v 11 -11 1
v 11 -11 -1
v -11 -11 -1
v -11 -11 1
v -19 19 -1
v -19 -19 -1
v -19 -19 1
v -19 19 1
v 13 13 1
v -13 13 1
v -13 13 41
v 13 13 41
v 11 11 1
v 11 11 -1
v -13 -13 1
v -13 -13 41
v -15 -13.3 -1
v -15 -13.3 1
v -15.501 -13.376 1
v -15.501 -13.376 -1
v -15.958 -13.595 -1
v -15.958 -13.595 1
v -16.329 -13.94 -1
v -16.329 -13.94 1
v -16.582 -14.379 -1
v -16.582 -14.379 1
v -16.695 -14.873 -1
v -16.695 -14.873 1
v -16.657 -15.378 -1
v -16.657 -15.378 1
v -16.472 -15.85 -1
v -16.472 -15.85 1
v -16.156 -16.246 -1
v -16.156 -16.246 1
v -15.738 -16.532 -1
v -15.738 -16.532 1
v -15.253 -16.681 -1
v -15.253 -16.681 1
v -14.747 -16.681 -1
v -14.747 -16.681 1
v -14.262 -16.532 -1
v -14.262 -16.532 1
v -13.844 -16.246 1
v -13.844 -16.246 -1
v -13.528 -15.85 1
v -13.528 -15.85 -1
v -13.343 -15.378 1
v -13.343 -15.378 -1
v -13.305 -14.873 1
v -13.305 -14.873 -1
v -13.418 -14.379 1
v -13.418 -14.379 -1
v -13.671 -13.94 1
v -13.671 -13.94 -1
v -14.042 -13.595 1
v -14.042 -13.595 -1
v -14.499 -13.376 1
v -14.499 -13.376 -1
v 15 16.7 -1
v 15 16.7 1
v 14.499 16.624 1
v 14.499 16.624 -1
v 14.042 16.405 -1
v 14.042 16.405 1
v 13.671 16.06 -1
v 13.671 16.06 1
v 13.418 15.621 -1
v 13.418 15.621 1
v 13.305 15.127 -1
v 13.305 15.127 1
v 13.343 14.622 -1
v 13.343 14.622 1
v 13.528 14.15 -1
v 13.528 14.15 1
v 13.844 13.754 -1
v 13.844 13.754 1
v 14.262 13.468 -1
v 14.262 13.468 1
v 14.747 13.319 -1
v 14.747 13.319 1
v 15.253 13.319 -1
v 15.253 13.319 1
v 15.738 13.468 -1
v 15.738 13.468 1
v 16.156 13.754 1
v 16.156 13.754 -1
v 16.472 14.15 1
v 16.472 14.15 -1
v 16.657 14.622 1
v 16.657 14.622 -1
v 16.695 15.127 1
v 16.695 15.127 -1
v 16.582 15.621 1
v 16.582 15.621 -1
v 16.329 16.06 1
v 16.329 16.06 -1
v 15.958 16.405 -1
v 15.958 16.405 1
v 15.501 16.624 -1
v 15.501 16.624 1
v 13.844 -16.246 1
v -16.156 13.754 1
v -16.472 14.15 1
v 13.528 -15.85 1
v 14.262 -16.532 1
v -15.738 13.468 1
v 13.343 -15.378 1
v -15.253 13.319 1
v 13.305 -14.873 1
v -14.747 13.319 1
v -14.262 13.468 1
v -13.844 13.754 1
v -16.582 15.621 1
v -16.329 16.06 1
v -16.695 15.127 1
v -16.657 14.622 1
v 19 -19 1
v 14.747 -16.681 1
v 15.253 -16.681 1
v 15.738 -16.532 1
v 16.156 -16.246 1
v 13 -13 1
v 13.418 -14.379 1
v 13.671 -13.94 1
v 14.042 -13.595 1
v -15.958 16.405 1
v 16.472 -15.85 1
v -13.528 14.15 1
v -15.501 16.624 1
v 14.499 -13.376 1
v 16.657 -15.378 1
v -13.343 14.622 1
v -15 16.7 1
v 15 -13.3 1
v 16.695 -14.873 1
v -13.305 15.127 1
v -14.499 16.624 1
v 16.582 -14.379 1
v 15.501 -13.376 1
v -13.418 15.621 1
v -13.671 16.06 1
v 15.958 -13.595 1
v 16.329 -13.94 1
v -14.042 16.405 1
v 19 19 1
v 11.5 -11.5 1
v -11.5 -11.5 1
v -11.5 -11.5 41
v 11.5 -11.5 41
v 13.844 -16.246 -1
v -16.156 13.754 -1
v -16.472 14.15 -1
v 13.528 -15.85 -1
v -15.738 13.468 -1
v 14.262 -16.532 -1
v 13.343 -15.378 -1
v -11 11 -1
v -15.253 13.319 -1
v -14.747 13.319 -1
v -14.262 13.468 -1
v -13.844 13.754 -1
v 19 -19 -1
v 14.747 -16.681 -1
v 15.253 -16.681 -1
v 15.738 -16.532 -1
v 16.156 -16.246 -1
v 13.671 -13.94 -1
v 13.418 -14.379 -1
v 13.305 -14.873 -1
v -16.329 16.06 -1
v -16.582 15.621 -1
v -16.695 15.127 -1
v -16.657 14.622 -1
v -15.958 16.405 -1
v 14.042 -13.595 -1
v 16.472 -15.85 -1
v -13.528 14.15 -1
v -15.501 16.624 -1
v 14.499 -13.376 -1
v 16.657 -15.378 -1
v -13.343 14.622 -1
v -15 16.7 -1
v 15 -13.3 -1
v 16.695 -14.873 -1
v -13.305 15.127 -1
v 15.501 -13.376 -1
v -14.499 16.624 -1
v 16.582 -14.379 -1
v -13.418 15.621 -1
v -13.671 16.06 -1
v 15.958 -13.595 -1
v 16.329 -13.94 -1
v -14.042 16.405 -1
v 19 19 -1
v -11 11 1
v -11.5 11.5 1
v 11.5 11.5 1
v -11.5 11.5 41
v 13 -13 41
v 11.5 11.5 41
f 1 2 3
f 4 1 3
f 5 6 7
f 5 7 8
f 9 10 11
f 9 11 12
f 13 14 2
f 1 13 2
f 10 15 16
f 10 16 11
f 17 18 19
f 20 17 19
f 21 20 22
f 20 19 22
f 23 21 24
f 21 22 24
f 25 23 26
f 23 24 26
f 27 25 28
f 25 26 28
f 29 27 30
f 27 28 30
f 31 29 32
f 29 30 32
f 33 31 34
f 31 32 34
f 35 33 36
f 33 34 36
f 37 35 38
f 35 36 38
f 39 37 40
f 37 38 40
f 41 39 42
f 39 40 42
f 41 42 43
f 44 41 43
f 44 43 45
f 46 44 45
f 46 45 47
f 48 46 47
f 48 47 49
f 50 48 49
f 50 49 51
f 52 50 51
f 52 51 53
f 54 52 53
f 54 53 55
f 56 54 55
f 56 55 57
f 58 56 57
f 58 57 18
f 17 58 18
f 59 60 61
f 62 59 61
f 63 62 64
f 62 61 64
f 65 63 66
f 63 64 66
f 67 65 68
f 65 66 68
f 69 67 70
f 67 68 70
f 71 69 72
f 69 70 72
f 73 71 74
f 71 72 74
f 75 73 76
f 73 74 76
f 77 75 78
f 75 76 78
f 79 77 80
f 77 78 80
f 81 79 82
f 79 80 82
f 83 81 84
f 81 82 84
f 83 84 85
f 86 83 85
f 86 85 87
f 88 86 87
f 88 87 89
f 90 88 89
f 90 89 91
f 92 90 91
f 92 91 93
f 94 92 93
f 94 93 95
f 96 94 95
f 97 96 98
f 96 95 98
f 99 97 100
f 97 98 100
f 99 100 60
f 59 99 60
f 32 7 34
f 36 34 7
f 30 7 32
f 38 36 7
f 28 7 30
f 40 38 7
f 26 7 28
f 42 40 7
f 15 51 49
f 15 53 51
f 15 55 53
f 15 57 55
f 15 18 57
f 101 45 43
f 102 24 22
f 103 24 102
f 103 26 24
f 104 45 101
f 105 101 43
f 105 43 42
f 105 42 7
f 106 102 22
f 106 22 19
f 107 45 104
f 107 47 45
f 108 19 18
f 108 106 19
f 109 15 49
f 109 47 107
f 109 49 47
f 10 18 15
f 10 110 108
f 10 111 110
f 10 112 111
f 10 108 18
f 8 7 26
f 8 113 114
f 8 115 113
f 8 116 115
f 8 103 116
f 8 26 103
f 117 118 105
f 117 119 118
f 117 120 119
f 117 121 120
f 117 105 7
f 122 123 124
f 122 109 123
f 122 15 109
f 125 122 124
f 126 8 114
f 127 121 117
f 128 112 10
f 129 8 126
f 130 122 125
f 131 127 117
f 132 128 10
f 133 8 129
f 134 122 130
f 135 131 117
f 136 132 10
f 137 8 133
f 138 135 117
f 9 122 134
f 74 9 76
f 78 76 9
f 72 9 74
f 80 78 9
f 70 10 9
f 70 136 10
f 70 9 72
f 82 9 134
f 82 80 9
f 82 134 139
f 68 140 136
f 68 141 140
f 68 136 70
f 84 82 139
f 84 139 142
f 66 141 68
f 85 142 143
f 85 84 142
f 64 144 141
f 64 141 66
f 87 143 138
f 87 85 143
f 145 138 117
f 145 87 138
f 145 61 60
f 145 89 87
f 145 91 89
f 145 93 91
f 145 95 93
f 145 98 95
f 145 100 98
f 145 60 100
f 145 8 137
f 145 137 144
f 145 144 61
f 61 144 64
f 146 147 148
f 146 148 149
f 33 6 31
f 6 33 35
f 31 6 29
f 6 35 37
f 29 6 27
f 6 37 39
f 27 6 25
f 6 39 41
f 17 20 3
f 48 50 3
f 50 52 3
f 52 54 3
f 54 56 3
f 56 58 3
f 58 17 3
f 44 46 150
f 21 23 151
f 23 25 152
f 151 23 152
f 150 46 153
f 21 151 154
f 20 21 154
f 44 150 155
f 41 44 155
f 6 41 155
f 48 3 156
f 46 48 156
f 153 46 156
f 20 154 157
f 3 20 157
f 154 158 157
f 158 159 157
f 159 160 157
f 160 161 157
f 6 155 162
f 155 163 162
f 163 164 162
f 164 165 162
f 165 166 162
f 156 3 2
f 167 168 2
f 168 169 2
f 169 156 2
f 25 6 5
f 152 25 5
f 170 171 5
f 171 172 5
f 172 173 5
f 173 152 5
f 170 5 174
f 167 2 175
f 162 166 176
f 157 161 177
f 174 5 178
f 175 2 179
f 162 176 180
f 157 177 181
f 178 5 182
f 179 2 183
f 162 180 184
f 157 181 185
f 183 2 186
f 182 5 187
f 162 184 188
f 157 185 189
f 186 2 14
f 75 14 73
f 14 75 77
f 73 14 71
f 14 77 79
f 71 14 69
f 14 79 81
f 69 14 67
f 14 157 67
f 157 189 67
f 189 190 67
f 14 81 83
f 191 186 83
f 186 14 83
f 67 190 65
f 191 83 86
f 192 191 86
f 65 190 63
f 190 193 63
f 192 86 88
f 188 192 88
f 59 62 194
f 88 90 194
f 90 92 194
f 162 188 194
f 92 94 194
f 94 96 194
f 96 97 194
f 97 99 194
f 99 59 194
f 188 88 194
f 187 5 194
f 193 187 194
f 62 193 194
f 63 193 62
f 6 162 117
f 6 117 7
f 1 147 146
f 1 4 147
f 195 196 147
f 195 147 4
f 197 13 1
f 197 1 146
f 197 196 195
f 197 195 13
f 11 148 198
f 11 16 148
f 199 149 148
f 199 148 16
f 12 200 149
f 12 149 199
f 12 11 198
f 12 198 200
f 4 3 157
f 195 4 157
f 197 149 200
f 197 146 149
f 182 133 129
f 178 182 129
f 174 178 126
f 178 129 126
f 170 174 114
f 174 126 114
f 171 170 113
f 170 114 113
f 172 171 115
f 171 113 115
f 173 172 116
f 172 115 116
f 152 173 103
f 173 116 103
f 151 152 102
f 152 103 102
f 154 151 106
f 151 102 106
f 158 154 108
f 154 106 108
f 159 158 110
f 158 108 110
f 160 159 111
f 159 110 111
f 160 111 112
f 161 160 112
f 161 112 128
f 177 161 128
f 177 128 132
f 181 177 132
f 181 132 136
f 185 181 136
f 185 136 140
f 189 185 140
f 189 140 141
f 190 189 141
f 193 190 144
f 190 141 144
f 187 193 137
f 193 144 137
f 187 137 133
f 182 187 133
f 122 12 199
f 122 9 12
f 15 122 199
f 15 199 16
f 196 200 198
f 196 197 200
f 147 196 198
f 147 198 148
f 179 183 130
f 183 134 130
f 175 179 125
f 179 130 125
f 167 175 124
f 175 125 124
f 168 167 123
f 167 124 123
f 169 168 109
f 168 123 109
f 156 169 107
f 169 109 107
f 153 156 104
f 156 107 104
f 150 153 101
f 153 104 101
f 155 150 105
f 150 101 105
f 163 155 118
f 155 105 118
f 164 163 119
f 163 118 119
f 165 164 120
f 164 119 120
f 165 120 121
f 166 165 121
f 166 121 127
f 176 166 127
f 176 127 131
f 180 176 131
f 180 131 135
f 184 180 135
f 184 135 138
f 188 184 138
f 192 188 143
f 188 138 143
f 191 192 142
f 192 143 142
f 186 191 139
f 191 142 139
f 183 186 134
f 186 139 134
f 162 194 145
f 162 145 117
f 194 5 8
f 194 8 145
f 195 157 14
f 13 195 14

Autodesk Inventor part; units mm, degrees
ref_plane "YZ Plane" through (0, 0, 0) normal (1, 0, 0) x (0, 1, 0)
ref_plane "XZ Plane" through (0, 0, 0) normal (0, 1, 0) x (-1, 0, 0)
ref_plane "XY Plane" through (0, 0, 0) normal (0, 0, 1) x (1, 0, 0)
sketch "Sketch1" plane through (0, 0, 0) normal (0, 0, 1) x (1, 0, 0)
  line L0 (-19, 19) -> (19, 19)
  line L1 (19, 19) -> (19, -19)
  line L2 (19, -19) -> (-19, -19)
  line L3 (-19, -19) -> (-19, 19)
  line L4 (-19, 19) -> (19, -19) construction
  line L5 (19, 19) -> (-19, -19) construction
  line L6 (-11, 11) -> (11, 11)
  line L7 (11, 11) -> (11, -11)
  line L8 (11, -11) -> (-11, -11)
  line L9 (-11, -11) -> (-11, 11)
  line L10 (-11, 11) -> (11, -11) construction
  line L11 (11, 11) -> (-11, -11) construction
  point P0 (0, 0)
  dimension "d0" = 38
  dimension "d1" = 38
  dimension "d2" = 22
  dimension "d3" = 22
extrude "Extrusion1" add sketch "Sketch1" along normal mid plane 2
sketch "Sketch2" plane through (0, 0, 1) normal (0, 0, 1) x (1, 0, 0)
  line L0 (-13, 13) -> (13, 13)
  line L1 (13, 13) -> (13, -13)
  line L2 (13, -13) -> (-13, -13)
  line L3 (-13, -13) -> (-13, 13)
  line L4 (-13, 13) -> (13, -13) construction
  line L5 (13, 13) -> (-13, -13) construction
  line L6 (-11.5, -11.5) -> (11.5, -11.5)
  line L7 (11.5, -11.5) -> (11.5, 11.5)
  line L8 (11.5, 11.5) -> (-11.5, 11.5)
  line L9 (-11.5, 11.5) -> (-11.5, -11.5)
  line L10 (-11.5, -11.5) -> (11.5, 11.5) construction
  line L11 (11.5, -11.5) -> (-11.5, 11.5) construction
  point P0 (0, 0)
  dimension "d6" = 26
  dimension "d7" = 26
  dimension "d8" = 23
extrude "Extrusion2" add sketch "Sketch2" along normal blind 40
sketch "Sketch3" plane through (0, 0, -1) normal (0, 0, -1) x (-1, 0, 0)
  line L0 (11, -11) -> (11, 11) projected
  line L1 (11, 11) -> (-11, 11) projected
  line L2 (-11, 11) -> (-11, -11) projected
  line L3 (-11, -11) -> (11, -11) projected
  line L4 (19, 19) -> (19, -19) projected
  line L5 (19, -19) -> (-19, -19) projected
  line L6 (-19, -19) -> (-19, 19) projected
  line L7 (-19, 19) -> (19, 19) projected
  point P0 (0, 0)
  point P1 (15, -15)
  point P2 (-15, -15)
  point P3 (15, 15)
  point P4 (-15, 15)
  dimension "d11" = 15
  dimension "d12" = 15
  dimension "d15" = 30
  dimension "d18" = 30
hole "Hole1" at (-15, -15, -1) at (15, -15, -1) at (-15, 15, -1) at (15, 15, -1) direction (0, 0, 1) diameter 3.4 end through all clearance for "Flat Head Machine Screw" size "M3" standard "Ansi Metric M Profile"
equation "\"d1\" = d0"
equation "\"d3\" = d2"
equation "\"d7\" = d6"
properties part number "pmtholder"
